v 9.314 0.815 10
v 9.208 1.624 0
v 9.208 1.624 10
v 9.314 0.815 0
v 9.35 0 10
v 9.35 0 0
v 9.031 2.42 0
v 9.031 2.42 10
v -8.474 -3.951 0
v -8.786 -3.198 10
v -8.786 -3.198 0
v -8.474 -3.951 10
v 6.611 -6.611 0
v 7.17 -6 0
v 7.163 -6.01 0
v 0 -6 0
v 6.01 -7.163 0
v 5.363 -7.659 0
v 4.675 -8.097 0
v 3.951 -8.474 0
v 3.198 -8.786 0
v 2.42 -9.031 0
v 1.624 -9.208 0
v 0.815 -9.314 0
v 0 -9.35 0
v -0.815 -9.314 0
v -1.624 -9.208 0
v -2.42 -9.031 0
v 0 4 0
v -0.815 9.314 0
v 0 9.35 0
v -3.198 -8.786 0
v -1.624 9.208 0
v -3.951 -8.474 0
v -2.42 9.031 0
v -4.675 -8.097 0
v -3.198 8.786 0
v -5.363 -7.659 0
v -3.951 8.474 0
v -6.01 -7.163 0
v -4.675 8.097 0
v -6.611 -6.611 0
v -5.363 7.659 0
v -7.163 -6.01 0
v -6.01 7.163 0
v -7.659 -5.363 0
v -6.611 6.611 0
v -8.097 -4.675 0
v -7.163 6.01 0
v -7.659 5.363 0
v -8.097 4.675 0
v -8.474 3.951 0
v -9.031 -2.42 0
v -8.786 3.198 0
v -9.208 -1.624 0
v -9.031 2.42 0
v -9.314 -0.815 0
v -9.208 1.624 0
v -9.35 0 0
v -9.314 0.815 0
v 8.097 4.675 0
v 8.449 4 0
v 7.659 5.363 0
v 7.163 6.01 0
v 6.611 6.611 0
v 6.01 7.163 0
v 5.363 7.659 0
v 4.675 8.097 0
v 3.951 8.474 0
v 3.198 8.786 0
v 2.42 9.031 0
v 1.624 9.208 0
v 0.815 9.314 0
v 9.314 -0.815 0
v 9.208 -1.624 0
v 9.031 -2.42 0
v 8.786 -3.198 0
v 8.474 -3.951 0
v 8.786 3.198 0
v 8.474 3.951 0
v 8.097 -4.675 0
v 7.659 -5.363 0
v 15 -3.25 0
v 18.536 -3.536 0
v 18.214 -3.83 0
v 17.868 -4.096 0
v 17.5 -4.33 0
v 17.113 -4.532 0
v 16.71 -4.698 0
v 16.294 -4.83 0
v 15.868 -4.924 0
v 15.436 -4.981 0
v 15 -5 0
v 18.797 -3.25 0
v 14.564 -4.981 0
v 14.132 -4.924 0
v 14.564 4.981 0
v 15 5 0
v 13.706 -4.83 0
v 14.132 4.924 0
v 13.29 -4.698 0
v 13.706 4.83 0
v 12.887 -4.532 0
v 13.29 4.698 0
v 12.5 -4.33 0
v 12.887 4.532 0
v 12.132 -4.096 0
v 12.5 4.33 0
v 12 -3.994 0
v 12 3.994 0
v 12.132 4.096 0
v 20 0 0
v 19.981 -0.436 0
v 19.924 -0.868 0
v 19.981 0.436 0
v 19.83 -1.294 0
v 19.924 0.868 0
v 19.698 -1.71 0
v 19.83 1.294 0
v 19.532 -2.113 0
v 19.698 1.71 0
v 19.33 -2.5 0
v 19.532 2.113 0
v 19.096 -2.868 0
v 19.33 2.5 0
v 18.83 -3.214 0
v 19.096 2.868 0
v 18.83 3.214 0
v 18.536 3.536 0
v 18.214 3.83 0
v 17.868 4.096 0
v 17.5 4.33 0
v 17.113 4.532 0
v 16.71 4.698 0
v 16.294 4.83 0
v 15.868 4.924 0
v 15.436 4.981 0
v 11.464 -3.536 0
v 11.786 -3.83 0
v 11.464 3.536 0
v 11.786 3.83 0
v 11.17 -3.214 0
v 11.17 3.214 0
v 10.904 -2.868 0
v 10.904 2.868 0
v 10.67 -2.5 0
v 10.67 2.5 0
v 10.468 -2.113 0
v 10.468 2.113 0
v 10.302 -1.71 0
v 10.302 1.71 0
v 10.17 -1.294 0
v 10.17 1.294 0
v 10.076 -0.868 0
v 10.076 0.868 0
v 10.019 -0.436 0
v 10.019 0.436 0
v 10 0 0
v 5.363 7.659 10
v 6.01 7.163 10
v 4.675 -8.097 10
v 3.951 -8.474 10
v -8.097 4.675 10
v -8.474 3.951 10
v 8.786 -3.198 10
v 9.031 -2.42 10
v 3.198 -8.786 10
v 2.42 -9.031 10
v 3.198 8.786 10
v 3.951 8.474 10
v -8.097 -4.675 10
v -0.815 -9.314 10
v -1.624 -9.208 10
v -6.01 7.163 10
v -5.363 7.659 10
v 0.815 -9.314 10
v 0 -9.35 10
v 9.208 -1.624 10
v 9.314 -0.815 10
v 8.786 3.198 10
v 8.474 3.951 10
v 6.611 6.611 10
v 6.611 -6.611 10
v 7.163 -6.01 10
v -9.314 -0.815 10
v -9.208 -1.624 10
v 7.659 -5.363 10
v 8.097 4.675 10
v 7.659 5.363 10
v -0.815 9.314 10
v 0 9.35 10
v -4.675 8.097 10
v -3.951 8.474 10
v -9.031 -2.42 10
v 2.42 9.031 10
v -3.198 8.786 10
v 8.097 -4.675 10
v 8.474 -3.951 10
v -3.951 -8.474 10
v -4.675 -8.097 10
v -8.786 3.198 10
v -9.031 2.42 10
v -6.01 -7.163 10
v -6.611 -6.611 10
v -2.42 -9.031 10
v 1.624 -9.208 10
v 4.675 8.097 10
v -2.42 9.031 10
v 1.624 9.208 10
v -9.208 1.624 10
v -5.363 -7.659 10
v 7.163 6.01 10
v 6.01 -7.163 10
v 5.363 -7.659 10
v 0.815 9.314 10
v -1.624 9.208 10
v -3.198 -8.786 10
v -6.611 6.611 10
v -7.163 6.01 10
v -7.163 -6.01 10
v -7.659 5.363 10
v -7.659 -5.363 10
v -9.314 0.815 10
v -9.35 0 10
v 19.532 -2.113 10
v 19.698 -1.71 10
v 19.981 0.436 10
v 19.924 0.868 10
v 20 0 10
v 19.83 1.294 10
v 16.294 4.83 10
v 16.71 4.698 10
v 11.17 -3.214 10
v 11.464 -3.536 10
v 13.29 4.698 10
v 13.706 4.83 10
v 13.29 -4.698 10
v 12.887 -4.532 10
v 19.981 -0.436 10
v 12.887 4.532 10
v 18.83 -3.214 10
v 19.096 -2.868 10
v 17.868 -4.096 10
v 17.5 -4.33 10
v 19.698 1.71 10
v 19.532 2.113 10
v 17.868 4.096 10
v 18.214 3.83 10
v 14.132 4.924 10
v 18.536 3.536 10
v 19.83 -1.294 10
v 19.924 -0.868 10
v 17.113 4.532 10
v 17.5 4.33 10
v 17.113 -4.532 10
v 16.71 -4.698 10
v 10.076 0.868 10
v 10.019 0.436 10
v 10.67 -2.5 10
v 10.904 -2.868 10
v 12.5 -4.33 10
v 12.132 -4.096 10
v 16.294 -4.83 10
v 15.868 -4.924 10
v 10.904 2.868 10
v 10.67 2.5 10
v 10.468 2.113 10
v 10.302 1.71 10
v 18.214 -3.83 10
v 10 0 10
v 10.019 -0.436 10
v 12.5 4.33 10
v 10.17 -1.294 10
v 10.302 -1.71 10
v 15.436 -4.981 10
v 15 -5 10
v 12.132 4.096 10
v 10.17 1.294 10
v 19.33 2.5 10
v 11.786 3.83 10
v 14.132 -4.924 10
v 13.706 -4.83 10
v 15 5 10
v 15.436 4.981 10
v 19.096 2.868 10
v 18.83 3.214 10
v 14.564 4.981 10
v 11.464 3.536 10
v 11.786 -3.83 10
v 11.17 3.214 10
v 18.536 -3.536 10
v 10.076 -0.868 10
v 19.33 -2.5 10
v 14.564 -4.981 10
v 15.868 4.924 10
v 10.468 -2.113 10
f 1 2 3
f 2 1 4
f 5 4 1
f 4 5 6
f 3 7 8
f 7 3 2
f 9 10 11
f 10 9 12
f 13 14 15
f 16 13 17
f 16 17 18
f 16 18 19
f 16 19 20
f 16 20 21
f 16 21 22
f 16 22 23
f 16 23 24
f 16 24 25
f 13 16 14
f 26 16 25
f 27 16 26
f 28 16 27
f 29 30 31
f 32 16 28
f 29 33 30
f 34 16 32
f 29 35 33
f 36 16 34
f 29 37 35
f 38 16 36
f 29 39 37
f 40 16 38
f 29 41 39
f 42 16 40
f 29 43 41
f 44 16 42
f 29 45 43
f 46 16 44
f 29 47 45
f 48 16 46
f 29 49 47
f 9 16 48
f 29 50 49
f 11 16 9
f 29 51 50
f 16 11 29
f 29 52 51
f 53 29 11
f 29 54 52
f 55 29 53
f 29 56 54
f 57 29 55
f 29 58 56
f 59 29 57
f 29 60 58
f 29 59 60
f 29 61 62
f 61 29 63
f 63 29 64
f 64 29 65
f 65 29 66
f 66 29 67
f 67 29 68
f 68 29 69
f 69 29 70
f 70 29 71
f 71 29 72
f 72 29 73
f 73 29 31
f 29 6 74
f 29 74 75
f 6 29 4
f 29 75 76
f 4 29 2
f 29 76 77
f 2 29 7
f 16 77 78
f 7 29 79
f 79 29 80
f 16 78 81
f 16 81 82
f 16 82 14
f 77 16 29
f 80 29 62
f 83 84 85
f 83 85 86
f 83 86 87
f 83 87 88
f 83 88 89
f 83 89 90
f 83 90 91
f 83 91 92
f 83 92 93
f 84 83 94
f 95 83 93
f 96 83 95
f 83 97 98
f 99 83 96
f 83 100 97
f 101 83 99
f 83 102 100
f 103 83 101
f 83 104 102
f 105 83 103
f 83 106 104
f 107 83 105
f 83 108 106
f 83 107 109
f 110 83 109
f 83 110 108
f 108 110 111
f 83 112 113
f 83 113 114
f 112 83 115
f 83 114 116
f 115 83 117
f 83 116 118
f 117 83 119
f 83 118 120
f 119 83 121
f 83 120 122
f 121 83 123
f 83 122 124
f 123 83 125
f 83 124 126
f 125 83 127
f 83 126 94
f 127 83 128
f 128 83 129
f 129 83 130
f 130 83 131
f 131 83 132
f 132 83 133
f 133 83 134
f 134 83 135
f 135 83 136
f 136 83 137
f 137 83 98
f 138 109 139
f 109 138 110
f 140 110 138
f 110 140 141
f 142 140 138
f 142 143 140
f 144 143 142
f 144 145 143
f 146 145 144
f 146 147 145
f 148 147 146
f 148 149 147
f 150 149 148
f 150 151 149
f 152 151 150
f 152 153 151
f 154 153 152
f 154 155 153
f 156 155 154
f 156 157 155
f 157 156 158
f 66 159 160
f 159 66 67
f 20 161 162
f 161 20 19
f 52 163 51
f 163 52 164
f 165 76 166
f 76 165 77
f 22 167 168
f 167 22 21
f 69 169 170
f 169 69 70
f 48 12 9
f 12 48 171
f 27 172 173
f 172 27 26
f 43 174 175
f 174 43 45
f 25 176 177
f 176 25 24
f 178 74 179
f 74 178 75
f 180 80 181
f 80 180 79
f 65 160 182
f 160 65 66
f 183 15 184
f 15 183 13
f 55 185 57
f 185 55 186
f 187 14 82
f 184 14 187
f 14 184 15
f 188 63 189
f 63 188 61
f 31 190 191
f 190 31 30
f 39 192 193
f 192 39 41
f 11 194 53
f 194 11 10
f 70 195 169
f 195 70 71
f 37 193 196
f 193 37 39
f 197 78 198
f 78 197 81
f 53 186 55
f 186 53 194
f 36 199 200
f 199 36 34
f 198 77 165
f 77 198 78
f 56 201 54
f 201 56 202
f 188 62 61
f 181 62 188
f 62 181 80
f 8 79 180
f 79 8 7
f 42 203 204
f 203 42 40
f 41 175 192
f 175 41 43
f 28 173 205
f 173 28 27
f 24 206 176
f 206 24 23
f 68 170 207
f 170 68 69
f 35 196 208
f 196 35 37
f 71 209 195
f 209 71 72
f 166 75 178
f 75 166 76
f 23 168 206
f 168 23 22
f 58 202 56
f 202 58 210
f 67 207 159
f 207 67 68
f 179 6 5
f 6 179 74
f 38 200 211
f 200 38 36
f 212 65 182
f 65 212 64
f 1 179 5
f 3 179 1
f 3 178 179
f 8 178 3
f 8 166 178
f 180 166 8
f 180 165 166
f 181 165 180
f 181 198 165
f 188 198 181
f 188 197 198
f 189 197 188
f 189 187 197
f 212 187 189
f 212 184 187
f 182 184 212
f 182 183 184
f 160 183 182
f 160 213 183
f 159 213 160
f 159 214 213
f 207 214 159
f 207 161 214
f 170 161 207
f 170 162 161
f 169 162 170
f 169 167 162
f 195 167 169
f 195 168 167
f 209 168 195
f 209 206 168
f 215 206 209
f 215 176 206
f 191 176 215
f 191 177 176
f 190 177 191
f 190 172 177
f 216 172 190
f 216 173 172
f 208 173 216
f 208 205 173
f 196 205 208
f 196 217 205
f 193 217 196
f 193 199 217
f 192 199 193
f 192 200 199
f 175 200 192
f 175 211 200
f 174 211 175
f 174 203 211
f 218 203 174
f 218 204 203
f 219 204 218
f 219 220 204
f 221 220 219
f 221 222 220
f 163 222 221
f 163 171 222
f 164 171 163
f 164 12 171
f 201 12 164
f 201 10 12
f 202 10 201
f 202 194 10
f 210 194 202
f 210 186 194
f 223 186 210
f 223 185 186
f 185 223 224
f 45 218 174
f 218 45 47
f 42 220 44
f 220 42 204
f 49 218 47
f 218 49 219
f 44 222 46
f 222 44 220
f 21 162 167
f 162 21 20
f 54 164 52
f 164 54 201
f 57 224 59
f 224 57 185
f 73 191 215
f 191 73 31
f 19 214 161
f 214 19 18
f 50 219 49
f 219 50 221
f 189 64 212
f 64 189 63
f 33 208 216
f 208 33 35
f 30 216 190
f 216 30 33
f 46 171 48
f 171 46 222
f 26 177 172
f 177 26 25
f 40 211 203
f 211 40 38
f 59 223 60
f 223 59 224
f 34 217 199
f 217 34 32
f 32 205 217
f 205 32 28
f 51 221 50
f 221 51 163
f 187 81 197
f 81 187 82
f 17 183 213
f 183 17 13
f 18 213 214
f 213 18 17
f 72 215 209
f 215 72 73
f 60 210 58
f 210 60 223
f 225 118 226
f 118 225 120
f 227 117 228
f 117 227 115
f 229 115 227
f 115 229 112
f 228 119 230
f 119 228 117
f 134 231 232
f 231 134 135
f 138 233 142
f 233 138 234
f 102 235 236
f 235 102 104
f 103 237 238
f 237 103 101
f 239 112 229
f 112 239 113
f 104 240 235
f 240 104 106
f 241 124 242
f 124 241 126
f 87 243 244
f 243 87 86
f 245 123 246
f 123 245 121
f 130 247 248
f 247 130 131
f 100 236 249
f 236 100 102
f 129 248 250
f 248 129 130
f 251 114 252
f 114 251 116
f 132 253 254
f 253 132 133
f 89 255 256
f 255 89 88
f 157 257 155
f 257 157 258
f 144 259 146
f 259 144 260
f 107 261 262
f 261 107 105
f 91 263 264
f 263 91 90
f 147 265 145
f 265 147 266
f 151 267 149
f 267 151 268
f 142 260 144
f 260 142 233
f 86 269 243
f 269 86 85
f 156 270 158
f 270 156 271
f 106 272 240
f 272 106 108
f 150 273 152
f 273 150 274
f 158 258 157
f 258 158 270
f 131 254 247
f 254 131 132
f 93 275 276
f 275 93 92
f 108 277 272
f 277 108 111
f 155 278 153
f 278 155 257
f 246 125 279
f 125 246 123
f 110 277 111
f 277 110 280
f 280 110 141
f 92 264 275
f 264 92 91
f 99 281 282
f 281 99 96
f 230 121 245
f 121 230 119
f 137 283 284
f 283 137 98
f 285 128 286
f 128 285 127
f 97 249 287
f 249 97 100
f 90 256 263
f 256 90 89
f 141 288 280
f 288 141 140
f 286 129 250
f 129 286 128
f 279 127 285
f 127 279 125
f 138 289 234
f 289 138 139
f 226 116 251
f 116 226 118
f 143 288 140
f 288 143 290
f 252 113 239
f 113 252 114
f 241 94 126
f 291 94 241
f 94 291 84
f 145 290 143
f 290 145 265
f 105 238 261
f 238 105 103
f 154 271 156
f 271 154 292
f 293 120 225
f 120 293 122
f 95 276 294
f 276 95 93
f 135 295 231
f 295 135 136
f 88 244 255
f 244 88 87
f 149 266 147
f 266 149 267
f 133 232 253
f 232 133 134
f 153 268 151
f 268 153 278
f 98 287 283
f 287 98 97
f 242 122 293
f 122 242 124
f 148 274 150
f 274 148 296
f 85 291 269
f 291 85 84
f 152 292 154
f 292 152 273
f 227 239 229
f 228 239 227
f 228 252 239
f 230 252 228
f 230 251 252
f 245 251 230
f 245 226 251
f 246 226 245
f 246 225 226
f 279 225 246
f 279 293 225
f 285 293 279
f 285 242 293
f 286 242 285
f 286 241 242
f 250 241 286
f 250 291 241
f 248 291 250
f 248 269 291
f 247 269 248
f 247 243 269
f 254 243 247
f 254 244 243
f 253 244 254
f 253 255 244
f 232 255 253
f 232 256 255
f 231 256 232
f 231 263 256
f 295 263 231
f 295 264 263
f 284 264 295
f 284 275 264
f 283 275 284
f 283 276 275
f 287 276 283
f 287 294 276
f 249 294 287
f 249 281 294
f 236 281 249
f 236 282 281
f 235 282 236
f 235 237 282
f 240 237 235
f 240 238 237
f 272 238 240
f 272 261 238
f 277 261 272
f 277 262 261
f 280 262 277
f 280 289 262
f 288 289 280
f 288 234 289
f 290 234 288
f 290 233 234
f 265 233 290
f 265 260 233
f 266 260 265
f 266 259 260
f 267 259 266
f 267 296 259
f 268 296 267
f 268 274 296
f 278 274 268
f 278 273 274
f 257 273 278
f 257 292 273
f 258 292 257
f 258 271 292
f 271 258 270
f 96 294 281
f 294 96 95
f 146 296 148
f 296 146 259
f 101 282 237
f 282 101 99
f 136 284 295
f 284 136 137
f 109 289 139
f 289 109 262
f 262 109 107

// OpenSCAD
// Stand rod and tubing clip - a part that snaps onto a round stand rod (e.g. a bench mat
// stand or shelf pole) and holds a piece of round tubing next to it. NOVEL general part.
//

stand_d  = 12.7;
tubing_d = 6;
height   = 10;

$fn = 72;

ring_d = stand_d + 2 * 3;          // outer diameter of the stand ring
open   = 10;                       // opening in the stand ring, so it snaps onto the rod

bridge_w = 6;
t        = min(2, height - 1);      // keep a wall above the lowest slot

difference() {
    union() {
        cylinder(h = height, d = ring_d);                 // stand ring (outer)
        cylinder(h = height - 0.01, d = stand_d + 2 * 3 - open);   // stand ring (inner)
        translate([15, 0, 0]) cylinder(h = height, d = tubing_d + 2 * 2);                 // tubing ring (outer)
        translate([15, 0, 0]) cylinder(h = height - 0.01, d = tubing_d + 2 * 2 - 4.5);   // tubing ring (inner)
        translate([-bridge_w / 2, -t / 2, 0]) cube([bridge_w, t, height]);                 // bridge
    }
    translate([0, -open / 2 - 1, 0]) rotate([-90, 0, 0]) cube([open + 2, t + 2, height]);           // stand ring opening
    translate([15, -4.5 / 2 - 1, 0]) rotate([-90, 0, 0]) cube([4.5 + 2, t + 2, height]);           // tubing ring opening
}
